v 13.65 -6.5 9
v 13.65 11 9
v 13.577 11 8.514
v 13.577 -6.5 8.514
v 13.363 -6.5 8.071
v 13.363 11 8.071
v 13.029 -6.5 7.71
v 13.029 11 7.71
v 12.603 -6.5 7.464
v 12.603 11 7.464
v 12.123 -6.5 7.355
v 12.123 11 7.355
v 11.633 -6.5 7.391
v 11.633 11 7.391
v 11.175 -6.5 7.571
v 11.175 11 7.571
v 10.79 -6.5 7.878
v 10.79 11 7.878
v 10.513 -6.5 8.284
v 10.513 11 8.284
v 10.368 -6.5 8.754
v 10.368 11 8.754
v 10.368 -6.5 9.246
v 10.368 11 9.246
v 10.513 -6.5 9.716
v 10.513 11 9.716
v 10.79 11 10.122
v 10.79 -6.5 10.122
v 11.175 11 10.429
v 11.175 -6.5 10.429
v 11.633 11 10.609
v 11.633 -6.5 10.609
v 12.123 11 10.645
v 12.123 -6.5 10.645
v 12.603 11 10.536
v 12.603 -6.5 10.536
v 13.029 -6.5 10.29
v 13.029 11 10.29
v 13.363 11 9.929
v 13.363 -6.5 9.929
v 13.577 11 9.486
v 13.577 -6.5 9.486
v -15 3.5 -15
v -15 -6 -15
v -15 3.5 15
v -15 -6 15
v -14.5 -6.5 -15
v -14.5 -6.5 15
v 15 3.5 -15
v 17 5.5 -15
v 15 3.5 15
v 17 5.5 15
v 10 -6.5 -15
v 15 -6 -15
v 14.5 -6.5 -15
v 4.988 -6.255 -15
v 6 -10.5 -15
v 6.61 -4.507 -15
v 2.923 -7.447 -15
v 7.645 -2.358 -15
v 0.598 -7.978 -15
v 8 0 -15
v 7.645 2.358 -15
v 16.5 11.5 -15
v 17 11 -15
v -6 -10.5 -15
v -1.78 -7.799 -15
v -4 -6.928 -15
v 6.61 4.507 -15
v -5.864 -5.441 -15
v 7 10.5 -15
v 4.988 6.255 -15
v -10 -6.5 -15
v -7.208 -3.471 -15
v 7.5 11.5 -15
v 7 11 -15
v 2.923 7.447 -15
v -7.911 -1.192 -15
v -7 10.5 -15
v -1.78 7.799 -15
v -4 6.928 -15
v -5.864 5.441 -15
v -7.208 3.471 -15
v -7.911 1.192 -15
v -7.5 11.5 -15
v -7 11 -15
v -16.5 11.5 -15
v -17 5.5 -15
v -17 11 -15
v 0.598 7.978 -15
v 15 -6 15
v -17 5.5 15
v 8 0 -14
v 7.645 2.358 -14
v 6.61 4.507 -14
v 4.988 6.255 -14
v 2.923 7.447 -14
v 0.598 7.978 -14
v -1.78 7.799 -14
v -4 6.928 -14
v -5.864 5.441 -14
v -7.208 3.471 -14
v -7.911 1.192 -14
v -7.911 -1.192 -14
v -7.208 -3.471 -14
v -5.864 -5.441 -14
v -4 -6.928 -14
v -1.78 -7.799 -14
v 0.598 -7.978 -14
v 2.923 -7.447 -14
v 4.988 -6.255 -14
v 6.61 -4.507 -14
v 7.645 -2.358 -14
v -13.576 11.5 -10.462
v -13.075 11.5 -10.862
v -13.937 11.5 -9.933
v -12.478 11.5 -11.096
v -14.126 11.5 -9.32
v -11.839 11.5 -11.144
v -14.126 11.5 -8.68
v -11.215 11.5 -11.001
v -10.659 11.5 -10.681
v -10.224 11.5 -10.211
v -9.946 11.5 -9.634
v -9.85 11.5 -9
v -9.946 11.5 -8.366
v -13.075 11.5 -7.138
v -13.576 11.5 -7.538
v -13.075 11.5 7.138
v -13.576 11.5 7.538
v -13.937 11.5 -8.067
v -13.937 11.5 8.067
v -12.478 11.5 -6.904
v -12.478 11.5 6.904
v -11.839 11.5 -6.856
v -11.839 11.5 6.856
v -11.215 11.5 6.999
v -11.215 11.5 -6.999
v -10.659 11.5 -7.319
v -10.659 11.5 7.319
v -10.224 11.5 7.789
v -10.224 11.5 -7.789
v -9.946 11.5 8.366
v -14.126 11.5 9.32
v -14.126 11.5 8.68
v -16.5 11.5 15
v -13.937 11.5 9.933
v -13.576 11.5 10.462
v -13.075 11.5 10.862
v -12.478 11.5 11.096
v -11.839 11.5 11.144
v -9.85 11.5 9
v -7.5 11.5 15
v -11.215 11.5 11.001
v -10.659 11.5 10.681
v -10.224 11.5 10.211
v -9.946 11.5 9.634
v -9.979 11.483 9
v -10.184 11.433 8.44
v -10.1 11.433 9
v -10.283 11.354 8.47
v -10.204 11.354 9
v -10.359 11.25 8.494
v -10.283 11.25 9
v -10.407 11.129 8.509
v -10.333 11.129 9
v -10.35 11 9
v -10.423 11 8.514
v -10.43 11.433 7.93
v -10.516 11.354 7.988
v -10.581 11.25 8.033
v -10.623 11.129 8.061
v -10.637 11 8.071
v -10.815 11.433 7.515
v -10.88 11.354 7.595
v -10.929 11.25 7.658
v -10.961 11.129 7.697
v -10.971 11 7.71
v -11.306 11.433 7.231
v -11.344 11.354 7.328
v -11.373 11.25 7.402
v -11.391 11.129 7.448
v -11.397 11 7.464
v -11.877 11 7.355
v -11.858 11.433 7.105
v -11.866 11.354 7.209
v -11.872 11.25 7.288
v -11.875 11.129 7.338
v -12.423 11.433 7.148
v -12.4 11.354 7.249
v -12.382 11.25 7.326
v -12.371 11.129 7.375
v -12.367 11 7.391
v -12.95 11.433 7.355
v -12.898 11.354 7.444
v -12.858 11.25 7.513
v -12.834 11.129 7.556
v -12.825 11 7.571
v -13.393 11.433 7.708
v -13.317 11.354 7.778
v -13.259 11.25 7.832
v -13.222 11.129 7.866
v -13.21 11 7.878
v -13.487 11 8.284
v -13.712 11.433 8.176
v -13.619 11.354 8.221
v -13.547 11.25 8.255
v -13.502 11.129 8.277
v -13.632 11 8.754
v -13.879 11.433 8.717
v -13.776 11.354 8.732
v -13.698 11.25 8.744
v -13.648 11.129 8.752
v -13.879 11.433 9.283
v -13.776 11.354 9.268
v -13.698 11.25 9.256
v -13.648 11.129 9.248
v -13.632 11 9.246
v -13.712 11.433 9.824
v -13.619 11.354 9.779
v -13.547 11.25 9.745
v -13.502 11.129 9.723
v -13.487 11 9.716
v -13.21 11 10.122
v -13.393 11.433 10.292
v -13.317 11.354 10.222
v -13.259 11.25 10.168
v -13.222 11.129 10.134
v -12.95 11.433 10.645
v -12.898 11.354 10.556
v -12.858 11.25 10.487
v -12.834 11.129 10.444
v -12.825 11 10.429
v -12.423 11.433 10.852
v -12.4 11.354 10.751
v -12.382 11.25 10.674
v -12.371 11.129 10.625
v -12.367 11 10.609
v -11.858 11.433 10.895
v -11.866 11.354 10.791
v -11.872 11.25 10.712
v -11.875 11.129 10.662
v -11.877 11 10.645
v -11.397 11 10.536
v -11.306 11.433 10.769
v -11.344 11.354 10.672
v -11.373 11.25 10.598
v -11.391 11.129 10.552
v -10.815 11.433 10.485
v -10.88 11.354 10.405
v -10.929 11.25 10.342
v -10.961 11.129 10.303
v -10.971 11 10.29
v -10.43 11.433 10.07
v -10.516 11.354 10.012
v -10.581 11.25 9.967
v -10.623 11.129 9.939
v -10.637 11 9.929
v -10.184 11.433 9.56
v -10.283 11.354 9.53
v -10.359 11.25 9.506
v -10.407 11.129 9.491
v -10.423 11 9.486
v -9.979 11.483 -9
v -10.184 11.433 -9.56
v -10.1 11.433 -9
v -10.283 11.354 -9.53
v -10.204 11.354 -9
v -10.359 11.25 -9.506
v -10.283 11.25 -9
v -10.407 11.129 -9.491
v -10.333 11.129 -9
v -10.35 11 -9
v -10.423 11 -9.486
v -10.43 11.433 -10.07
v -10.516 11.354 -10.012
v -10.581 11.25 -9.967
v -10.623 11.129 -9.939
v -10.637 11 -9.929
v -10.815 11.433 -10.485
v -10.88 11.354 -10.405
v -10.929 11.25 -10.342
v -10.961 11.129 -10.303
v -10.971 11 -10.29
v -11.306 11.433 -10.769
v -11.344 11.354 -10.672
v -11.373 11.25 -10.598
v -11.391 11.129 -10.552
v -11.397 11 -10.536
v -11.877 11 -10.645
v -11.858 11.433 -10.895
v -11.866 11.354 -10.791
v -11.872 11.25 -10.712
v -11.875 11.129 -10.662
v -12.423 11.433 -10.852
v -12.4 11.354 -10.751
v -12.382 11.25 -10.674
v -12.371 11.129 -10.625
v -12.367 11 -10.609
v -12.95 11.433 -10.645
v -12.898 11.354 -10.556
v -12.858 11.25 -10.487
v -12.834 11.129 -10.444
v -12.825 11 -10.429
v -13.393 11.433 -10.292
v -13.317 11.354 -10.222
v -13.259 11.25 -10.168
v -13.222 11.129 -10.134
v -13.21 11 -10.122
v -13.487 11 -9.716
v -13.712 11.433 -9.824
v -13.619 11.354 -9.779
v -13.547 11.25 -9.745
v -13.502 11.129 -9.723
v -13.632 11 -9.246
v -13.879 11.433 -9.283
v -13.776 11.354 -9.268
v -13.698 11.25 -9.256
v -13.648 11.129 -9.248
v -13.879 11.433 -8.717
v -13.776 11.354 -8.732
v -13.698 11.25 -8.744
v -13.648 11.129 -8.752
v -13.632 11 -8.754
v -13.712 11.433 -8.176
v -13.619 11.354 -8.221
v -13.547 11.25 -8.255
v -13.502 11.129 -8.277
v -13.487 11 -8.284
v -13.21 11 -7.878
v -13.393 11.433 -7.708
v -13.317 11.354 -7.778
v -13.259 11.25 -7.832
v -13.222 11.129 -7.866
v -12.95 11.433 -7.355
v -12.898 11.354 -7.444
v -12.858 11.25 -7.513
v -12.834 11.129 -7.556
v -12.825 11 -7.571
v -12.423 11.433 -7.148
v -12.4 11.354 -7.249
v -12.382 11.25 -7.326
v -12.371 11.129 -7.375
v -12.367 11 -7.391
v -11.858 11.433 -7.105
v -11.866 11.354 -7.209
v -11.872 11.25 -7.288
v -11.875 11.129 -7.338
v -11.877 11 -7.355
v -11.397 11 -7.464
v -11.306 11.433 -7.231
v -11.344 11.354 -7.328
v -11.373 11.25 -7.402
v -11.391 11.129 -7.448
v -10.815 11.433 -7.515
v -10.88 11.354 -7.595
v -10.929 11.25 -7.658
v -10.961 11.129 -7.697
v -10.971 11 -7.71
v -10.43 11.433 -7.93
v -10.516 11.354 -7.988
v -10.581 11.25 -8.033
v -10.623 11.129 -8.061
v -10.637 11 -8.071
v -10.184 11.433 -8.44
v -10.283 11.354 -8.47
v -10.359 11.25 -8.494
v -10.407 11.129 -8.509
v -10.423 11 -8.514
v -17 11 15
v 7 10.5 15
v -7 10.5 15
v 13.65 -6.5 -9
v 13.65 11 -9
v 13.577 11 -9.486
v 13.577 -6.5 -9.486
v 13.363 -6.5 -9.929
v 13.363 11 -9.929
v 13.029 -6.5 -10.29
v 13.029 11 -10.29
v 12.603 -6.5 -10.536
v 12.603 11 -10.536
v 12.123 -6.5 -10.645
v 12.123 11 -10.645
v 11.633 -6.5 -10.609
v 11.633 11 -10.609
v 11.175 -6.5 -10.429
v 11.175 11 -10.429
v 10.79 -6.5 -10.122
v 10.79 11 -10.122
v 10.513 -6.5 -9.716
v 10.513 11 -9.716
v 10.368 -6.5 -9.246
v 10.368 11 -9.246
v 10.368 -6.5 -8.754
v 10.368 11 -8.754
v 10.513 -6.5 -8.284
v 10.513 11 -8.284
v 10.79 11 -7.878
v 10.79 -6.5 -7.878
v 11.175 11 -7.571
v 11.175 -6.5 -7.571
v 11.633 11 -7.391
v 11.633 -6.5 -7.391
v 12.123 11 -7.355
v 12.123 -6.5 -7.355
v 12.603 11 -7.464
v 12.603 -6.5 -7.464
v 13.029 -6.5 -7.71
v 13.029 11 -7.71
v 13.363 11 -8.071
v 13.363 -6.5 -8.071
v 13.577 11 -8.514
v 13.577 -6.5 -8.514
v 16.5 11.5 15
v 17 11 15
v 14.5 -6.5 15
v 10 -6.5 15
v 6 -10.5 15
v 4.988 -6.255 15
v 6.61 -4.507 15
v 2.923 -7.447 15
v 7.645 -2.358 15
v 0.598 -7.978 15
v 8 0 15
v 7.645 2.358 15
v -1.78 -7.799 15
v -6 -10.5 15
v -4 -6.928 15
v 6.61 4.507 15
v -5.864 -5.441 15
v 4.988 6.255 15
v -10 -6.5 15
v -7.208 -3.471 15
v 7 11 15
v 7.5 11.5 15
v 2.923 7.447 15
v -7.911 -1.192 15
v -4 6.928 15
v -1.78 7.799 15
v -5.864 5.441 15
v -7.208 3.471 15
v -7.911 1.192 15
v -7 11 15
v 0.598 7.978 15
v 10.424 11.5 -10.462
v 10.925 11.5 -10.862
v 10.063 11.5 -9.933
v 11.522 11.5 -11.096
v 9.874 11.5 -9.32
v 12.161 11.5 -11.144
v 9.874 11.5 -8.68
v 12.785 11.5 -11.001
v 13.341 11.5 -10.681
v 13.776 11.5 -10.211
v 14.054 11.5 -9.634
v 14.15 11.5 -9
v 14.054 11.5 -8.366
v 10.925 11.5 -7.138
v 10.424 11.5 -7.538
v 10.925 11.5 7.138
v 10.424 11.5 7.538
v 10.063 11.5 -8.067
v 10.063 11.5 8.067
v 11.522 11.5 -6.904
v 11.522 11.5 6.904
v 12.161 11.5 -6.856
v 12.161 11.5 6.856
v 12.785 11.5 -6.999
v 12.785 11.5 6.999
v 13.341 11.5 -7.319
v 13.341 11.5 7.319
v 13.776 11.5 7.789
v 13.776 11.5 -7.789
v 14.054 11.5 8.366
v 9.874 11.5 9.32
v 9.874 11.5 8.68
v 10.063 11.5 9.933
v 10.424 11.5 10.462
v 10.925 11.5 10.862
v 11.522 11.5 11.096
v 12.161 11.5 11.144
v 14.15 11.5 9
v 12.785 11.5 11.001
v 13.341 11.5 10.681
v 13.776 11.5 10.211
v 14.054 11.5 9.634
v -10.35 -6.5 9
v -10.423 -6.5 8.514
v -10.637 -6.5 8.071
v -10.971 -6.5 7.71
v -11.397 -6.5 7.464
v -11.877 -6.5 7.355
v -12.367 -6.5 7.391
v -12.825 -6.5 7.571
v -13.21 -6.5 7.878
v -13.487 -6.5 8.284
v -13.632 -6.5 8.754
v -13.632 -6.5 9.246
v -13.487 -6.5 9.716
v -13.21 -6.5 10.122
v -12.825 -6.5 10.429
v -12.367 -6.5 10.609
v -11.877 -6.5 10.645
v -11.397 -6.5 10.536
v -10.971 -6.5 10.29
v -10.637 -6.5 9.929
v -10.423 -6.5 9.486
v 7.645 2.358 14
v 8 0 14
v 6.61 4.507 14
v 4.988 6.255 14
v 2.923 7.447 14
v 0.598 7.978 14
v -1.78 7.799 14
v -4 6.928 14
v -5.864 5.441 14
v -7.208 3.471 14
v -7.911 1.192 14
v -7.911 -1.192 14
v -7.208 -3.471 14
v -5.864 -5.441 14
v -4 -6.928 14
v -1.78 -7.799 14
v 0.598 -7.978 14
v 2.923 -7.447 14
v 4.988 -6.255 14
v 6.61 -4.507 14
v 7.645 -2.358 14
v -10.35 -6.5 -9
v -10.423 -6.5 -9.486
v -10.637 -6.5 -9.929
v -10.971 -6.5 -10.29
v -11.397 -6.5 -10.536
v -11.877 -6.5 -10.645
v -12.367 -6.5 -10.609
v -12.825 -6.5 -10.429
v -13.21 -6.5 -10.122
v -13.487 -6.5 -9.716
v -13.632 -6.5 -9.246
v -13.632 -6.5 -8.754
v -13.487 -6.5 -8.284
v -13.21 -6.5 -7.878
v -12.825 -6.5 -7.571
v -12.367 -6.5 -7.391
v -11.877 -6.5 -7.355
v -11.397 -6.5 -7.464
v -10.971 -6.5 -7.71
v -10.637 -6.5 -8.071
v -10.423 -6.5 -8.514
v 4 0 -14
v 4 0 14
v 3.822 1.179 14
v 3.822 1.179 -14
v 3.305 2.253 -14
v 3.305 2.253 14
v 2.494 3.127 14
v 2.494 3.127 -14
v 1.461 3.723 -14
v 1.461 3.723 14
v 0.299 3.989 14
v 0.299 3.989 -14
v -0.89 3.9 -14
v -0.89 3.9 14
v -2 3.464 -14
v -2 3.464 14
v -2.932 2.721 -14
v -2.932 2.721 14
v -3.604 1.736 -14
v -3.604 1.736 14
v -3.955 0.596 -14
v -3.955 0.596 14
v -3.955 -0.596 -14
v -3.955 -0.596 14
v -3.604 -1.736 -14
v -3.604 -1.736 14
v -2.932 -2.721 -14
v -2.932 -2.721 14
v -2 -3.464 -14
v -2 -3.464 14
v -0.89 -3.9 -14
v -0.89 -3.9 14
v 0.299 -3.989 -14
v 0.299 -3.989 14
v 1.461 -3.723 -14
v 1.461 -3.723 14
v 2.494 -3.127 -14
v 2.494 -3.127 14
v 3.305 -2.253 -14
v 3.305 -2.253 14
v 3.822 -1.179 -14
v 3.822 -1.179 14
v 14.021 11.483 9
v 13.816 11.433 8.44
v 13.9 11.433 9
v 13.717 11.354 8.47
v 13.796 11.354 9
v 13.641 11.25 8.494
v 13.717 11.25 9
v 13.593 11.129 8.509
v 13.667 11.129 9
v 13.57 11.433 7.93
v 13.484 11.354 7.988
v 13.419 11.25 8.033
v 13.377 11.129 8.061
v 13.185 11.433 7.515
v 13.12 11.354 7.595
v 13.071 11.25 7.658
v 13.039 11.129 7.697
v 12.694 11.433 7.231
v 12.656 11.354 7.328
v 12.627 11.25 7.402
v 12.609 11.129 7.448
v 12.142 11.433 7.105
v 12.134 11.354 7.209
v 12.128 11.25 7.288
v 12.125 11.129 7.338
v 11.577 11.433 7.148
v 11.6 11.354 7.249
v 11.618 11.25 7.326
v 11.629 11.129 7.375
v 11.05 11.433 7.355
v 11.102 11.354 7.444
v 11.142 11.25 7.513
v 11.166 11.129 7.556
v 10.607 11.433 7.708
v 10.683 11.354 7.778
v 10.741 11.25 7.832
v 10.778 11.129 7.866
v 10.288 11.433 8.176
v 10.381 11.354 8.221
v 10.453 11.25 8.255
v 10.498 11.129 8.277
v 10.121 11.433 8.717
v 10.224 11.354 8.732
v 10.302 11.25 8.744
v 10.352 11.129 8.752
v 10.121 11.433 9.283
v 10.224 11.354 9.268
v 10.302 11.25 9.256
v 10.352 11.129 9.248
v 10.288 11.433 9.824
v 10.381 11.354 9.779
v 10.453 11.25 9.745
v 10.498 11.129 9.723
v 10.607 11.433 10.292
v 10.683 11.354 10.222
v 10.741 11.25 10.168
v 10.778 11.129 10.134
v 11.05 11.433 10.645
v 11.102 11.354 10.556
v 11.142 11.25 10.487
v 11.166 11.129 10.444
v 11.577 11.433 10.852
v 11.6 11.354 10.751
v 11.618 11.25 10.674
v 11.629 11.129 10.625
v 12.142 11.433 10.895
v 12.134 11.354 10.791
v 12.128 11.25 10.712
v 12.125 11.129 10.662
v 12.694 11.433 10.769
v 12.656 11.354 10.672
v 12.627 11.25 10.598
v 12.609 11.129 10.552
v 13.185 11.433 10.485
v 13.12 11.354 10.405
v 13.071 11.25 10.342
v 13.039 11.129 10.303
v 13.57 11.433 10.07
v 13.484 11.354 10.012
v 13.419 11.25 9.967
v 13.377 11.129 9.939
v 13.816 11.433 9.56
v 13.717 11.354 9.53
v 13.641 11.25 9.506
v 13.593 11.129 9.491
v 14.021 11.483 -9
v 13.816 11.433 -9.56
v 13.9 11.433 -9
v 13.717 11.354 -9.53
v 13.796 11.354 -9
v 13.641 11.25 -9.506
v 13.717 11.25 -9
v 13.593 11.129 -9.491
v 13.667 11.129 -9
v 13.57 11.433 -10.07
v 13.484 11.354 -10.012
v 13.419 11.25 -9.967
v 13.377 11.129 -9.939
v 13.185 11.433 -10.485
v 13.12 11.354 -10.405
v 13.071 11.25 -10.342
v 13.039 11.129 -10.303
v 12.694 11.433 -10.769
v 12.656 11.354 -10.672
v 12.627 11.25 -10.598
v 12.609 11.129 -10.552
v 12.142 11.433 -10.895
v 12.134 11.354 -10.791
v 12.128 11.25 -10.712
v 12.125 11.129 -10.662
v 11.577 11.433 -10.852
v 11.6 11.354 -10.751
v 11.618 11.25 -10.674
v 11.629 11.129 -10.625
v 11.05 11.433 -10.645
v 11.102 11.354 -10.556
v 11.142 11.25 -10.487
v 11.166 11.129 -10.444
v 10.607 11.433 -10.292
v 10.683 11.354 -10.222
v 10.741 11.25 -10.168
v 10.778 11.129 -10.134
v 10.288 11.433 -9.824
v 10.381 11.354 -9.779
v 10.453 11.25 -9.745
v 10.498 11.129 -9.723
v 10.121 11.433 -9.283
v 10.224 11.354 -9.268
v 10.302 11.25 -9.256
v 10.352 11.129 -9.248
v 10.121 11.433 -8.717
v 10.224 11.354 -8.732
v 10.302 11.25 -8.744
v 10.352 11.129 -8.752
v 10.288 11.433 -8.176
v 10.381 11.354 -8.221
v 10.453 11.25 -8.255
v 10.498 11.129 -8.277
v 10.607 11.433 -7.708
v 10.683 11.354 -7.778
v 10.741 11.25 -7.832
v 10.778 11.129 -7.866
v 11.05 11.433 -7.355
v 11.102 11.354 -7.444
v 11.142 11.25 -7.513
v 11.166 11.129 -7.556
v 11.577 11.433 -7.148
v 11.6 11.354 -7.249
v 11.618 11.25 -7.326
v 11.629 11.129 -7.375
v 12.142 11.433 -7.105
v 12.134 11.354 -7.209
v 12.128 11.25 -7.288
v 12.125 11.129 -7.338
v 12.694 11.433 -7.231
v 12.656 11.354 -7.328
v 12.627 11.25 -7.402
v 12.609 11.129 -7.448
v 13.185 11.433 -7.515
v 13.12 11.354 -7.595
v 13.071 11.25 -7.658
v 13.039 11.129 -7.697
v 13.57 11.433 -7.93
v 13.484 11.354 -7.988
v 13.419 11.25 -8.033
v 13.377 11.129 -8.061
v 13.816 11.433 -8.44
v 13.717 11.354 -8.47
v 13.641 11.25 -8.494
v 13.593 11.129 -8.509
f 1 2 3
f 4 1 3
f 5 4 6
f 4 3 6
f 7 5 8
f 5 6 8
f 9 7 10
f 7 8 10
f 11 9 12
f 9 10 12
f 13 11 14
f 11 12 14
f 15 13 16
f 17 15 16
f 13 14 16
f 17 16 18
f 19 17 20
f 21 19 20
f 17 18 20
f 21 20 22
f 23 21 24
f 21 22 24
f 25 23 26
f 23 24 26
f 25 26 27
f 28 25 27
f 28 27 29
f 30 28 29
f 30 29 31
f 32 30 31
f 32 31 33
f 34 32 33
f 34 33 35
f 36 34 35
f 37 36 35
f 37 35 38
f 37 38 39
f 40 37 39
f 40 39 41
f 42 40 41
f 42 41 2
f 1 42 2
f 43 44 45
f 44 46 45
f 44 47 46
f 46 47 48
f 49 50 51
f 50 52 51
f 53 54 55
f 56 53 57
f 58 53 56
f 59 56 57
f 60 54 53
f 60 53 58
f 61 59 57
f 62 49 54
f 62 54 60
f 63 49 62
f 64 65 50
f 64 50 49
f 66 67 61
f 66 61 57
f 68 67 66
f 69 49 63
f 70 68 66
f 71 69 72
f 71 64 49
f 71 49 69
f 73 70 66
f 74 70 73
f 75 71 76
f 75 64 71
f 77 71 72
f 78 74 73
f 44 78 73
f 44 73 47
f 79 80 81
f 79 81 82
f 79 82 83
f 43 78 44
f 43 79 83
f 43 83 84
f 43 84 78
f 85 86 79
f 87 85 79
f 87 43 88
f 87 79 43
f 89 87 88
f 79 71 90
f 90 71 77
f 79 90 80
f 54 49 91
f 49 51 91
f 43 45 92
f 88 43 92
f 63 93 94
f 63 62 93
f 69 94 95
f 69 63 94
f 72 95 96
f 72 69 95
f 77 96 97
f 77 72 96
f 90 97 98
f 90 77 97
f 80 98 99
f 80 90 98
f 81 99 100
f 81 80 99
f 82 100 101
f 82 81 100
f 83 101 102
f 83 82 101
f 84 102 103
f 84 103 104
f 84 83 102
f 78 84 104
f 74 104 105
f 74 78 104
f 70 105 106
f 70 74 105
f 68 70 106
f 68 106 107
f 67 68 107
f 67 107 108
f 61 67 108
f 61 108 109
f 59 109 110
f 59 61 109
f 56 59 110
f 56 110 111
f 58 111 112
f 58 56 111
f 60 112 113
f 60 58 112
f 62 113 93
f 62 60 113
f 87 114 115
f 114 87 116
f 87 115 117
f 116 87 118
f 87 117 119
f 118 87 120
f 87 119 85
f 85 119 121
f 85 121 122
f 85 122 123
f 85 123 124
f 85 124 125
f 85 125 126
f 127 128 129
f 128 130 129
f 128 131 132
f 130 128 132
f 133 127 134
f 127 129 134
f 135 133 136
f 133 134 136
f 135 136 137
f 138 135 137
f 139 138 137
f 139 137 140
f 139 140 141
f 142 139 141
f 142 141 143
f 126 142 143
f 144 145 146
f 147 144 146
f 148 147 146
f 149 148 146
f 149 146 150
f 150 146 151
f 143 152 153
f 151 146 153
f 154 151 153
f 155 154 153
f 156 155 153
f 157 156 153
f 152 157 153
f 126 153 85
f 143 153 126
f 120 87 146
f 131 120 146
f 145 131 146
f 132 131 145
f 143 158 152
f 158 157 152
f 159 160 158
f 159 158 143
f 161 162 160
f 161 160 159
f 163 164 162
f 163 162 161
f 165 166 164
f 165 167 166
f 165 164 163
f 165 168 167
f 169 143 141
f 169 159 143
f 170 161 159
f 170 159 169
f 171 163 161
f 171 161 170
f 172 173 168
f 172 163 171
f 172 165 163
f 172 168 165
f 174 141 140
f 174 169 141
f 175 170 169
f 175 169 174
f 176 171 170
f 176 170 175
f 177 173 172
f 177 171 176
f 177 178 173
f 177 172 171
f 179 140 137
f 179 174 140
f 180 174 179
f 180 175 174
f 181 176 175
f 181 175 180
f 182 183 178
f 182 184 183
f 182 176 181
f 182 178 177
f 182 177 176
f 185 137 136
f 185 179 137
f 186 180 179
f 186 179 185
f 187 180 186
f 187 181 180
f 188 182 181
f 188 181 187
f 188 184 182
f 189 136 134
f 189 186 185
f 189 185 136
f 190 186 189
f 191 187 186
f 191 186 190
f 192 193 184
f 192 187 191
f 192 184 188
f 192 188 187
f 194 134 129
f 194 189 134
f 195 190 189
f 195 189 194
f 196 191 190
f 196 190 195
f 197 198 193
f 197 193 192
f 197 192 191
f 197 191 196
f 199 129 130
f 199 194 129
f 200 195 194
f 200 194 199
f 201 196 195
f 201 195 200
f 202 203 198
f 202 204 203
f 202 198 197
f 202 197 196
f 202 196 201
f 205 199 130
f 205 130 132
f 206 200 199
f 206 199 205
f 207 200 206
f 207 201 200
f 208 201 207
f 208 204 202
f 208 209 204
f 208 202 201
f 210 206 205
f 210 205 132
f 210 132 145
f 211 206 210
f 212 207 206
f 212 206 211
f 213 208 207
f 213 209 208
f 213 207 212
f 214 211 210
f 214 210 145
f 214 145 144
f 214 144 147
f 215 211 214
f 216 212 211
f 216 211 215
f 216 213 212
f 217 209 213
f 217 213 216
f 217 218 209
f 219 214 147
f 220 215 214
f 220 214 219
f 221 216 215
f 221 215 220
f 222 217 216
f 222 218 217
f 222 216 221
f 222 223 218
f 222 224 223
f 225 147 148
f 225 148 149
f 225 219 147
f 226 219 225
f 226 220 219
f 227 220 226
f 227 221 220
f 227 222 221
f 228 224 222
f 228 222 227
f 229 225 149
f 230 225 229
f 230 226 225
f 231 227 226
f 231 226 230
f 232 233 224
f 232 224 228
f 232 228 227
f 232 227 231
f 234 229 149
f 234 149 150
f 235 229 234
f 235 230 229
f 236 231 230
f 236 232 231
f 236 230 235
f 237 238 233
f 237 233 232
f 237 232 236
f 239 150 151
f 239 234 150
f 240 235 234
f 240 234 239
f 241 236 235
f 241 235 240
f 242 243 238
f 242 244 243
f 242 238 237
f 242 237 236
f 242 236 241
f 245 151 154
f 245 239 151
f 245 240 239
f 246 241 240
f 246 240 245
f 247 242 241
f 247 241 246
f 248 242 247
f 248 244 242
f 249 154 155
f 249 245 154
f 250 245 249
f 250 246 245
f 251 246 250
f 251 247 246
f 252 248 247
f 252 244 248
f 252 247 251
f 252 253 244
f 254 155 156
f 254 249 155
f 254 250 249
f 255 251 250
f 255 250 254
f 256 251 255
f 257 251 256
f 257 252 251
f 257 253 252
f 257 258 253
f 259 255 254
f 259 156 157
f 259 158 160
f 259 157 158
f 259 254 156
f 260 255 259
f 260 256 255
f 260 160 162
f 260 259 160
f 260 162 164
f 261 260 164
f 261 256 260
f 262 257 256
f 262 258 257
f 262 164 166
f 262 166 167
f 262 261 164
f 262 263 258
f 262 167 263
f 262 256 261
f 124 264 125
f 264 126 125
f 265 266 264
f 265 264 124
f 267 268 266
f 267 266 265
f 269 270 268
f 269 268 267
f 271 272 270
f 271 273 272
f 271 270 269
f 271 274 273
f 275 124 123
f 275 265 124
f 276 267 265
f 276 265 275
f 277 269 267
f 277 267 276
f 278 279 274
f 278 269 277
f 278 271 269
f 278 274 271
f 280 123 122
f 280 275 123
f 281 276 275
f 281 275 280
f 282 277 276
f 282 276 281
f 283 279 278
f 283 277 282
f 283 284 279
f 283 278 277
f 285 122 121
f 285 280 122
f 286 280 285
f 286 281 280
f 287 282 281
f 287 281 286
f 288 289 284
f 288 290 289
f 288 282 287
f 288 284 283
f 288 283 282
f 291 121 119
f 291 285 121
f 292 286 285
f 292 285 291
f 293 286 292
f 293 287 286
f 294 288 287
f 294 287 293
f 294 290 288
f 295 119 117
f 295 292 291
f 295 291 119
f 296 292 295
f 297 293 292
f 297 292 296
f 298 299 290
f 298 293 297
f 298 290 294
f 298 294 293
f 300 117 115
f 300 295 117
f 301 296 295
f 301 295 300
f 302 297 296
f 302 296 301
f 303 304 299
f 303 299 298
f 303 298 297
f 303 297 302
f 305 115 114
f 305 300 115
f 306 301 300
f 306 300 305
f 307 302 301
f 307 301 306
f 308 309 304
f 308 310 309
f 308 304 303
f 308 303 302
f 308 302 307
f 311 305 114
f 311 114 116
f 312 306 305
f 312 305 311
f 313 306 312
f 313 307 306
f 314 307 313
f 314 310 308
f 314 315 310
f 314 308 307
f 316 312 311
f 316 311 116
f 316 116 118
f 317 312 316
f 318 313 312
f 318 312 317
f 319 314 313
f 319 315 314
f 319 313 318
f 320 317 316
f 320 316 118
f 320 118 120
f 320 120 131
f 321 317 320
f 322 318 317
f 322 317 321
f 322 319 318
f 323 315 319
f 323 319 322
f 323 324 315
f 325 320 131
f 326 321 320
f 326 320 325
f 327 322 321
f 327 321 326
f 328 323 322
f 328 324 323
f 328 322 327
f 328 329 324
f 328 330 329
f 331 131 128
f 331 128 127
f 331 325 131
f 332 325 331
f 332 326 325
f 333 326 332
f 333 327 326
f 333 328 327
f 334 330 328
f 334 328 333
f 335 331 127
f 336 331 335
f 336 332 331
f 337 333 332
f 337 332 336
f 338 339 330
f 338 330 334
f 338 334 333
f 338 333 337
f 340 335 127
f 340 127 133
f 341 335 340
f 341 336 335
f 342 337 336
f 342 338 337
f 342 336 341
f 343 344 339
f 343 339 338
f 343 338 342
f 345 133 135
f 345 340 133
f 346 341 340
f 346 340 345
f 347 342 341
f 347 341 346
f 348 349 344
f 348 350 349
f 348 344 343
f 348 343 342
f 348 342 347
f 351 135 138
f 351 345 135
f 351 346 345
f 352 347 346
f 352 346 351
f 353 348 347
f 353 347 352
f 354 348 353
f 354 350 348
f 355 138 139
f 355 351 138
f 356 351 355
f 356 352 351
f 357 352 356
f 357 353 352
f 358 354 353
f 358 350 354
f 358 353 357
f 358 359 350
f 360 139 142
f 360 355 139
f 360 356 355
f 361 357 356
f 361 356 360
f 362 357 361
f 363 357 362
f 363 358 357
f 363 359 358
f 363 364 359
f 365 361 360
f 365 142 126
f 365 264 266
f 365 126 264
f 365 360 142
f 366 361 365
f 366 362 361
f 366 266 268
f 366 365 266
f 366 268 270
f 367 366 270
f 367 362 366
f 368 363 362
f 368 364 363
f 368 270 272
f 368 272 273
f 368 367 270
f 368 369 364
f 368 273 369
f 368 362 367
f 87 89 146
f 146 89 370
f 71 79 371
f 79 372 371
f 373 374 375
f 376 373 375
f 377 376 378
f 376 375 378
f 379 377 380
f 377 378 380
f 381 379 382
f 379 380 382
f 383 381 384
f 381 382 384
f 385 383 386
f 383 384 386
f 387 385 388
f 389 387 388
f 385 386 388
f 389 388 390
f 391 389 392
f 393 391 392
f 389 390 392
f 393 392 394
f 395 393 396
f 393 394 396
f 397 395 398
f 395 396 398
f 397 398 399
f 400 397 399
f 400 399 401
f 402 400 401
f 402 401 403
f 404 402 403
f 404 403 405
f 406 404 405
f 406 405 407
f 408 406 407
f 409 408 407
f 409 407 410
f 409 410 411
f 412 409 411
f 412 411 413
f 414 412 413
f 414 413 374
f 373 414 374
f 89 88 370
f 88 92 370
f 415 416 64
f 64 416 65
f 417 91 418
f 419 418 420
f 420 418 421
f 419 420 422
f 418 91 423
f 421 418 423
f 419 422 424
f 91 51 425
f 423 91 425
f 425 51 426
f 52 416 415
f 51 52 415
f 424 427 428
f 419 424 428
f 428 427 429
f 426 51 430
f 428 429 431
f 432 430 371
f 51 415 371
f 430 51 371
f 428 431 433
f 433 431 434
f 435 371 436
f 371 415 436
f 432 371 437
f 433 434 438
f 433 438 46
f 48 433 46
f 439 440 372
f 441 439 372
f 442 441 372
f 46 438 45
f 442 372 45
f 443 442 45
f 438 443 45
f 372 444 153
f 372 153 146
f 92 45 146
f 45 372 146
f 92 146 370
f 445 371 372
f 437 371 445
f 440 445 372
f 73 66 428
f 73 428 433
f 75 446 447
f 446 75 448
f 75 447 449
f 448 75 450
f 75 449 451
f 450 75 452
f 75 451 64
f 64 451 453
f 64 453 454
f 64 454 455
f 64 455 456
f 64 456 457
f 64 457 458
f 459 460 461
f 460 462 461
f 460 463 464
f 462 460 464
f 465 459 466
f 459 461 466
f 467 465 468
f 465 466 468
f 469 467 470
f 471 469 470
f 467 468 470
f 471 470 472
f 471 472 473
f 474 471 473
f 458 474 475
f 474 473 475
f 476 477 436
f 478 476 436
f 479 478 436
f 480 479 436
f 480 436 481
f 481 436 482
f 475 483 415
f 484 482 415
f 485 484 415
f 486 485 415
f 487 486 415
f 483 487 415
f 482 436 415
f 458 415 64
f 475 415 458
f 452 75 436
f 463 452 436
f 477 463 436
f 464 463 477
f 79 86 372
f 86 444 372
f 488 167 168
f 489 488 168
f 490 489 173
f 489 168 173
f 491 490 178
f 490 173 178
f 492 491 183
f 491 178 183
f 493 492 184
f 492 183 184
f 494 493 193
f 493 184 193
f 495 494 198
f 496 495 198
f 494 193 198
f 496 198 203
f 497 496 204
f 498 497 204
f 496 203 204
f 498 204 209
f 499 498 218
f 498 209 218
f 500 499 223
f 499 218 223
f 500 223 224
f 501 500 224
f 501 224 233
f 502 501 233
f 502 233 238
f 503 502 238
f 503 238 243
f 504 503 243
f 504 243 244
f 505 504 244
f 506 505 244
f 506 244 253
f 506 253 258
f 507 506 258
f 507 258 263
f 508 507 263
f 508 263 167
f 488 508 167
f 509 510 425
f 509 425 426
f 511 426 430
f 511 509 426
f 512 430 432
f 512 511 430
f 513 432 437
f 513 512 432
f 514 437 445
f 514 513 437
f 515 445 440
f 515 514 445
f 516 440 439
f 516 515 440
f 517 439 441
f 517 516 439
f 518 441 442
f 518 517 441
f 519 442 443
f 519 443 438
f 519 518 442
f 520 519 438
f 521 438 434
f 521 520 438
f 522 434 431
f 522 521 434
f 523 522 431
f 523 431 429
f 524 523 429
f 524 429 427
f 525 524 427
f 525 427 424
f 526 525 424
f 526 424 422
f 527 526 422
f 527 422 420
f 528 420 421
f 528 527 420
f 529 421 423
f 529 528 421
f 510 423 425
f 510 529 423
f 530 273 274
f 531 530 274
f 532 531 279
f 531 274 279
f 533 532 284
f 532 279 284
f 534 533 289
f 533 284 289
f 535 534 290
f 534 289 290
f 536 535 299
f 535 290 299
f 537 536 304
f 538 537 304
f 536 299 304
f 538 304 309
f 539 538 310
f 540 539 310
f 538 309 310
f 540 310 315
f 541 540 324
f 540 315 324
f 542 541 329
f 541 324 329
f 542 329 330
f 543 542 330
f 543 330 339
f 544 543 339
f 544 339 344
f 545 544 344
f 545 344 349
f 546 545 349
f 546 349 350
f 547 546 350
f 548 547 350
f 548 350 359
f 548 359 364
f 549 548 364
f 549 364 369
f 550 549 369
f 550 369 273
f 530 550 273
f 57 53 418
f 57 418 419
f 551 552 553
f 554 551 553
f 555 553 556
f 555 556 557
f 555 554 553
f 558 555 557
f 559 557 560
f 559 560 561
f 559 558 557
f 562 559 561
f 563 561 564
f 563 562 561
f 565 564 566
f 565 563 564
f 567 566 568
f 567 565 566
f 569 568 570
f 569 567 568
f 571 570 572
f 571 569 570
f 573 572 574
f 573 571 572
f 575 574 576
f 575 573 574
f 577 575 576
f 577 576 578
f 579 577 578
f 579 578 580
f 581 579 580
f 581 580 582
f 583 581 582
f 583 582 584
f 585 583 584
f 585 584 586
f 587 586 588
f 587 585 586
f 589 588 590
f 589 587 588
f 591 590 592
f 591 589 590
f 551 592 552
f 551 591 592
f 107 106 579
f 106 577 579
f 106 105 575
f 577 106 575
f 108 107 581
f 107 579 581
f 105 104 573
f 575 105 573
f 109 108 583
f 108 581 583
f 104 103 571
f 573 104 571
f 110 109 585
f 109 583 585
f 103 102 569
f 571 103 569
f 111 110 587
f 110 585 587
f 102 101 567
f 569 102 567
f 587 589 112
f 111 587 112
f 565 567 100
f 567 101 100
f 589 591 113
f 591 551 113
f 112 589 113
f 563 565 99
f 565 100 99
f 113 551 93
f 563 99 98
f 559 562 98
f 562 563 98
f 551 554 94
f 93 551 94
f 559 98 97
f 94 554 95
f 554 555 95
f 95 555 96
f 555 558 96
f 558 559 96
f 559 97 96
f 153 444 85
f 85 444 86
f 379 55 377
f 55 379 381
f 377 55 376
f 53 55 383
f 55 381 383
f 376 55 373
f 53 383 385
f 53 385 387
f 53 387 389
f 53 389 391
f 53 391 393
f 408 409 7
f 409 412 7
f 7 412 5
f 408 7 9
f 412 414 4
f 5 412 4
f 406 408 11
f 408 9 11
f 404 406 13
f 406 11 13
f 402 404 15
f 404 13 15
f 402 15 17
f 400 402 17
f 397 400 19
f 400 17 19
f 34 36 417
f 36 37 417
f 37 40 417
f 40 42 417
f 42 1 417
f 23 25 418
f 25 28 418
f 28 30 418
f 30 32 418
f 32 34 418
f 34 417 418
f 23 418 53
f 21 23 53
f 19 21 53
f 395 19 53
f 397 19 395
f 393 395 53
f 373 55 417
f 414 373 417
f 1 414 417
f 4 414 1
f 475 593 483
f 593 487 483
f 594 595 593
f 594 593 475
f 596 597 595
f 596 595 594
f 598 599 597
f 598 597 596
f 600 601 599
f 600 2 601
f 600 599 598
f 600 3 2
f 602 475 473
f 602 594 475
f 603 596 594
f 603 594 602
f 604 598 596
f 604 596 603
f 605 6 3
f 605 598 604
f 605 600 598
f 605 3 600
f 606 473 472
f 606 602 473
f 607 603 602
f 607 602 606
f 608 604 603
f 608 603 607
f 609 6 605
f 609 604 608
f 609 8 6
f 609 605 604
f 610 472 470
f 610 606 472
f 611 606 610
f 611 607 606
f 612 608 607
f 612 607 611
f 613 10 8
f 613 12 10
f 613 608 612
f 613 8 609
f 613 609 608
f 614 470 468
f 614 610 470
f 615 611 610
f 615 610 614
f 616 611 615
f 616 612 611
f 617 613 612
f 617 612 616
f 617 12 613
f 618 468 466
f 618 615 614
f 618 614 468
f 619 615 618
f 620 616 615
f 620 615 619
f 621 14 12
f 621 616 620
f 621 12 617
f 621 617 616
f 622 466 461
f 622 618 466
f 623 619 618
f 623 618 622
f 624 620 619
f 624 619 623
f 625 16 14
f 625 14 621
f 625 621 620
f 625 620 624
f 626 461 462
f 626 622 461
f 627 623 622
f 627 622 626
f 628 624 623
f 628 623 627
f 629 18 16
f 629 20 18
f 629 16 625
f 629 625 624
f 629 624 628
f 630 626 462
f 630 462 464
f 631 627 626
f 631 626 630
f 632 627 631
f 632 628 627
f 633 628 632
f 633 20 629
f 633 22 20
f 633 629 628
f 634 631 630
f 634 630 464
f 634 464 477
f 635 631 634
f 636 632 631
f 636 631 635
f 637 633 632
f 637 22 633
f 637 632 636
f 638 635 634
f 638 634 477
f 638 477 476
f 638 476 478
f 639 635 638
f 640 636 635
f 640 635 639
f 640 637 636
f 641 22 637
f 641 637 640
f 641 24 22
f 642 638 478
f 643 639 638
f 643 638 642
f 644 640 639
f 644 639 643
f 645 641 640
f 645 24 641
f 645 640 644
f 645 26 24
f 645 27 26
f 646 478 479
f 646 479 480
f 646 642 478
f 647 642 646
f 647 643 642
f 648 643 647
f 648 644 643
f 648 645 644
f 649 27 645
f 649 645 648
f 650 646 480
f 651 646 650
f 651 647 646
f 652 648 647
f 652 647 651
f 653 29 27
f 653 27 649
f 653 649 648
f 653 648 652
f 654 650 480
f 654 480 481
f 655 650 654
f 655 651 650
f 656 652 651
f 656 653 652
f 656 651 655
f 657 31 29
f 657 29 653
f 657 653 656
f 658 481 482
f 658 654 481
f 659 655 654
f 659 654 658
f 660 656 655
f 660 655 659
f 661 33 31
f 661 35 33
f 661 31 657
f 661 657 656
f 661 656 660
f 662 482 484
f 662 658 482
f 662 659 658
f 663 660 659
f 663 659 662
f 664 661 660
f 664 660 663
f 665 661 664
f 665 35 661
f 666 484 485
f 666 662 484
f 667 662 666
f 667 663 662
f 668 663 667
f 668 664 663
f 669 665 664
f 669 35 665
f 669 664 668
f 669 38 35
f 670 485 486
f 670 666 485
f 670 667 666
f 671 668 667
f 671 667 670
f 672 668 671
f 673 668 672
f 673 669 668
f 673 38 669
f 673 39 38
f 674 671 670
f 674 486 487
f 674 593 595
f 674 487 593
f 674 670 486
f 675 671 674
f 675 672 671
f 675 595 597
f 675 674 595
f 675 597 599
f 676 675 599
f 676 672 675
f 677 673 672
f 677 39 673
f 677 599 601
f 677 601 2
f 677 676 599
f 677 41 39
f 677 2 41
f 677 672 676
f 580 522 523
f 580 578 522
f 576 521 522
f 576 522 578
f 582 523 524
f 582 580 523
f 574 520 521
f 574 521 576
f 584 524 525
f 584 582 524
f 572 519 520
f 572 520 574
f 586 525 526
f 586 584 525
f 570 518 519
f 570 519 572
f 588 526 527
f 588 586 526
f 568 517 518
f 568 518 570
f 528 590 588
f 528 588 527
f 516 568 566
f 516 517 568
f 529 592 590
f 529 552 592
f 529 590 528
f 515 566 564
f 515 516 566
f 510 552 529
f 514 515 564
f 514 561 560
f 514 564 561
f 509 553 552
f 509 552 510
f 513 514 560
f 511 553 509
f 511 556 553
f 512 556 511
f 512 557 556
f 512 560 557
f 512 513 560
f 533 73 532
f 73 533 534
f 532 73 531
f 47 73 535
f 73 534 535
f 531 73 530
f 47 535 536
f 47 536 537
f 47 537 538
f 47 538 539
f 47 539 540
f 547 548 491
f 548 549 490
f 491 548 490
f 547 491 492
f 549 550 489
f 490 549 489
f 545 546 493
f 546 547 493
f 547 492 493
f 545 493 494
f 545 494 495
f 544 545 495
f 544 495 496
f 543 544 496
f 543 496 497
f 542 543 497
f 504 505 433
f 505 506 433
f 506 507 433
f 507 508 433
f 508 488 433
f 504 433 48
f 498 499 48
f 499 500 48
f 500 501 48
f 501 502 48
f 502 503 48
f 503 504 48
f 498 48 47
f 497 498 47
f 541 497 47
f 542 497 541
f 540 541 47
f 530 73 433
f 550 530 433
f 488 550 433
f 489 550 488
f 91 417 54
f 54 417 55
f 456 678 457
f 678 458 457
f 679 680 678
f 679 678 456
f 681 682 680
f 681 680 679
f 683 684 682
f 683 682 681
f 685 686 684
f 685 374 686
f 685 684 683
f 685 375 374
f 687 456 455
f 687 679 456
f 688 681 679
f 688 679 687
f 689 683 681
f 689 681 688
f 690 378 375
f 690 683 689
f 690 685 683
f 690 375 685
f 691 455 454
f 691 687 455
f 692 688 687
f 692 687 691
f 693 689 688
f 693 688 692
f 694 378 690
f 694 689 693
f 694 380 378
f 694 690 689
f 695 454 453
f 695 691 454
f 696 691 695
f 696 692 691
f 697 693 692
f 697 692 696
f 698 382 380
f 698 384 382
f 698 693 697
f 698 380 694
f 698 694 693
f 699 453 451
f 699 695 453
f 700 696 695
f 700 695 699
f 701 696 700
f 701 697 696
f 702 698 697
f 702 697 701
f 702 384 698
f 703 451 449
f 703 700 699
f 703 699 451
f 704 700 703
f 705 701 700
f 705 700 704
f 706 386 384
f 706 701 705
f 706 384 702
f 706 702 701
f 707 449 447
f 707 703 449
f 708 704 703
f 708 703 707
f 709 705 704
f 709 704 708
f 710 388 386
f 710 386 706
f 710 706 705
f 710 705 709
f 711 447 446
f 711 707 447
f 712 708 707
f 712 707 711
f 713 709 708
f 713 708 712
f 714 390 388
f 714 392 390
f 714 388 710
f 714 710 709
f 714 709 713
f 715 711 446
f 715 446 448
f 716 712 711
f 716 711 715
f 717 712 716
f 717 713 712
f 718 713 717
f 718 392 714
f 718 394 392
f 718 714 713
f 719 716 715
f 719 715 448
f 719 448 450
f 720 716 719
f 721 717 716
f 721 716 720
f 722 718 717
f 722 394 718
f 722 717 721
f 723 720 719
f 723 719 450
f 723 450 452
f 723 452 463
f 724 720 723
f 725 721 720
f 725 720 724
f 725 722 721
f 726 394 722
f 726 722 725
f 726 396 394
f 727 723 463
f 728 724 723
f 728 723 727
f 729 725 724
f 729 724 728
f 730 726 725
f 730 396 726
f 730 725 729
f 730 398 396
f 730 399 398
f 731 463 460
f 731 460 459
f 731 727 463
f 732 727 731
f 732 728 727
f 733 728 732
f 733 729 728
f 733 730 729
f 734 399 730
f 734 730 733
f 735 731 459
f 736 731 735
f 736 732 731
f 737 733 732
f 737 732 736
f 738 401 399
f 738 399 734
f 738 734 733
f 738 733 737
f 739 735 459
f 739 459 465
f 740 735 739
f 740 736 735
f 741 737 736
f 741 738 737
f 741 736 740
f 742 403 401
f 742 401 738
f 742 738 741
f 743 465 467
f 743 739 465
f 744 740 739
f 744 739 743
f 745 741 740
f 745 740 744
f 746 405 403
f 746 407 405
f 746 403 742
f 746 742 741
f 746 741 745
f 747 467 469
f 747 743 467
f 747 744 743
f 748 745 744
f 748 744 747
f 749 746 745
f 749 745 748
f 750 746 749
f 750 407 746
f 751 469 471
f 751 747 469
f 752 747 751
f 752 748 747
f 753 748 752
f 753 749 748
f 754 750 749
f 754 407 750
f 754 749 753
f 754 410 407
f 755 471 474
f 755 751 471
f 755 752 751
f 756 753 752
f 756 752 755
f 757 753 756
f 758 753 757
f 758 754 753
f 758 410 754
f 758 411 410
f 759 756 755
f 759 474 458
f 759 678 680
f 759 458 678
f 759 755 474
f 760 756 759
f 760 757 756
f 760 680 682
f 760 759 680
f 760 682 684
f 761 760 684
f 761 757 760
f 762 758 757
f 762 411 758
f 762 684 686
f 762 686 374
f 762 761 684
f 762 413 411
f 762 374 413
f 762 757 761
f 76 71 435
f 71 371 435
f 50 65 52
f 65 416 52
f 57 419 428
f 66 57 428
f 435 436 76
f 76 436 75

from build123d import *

# Parameters (mm, degrees)
SKETCH1_R           = 8
BOSS_EXTRUDE1_DEPTH = 15
SKETCH2_R           = 1.65
CUT_EXTRUDE1_DEPTH  = 23
SKETCH3_R           = 8
SKETCH3_R_2         = 4
BOSS_EXTRUDE2_DEPTH = 14
FILLET1_R           = 0.5
CHAMFER1_SIZE       = 0.5


with BuildPart() as part:
    # Sketch1 → Boss-Extrude1 (new body, symmetric)
    with BuildSketch(Plane.XY):
        Polygon((-17, 11.5), (-7, 11.5), (-7, 10.5), (7, 10.5), (7, 11.5), (17, 11.5), (17, 5.5), (15, 3.5), (15, -6.5), (10, -6.5), (6, -10.5), (-6, -10.5), (-10, -6.5), (-15, -6.5), (-15, 3.5), (-17, 5.5), align=None)
        Circle(SKETCH1_R, mode=Mode.SUBTRACT)
    extrude(amount=BOSS_EXTRUDE1_DEPTH, both=True)

    # Sketch2 → Cut-Extrude1 (cut, through all)
    with BuildSketch(Plane(origin=(0, 11.5, 0), x_dir=(1, 0, 0), z_dir=(0, 1, 0))):
        with Locations((-12, 9)):
            Circle(SKETCH2_R)
        with Locations((-12, -9)):
            Circle(SKETCH2_R)
        with Locations((12, -9)):
            Circle(SKETCH2_R)
        with Locations((12, 9)):
            Circle(SKETCH2_R)
    extrude(amount=-CUT_EXTRUDE1_DEPTH, mode=Mode.SUBTRACT)

    # Sketch3 → Boss-Extrude2 (add, symmetric)
    with BuildSketch(Plane.XY):
        Circle(SKETCH3_R)
        Circle(SKETCH3_R_2, mode=Mode.SUBTRACT)
    extrude(amount=BOSS_EXTRUDE2_DEPTH, both=True)

    # Fillet1
    fillet1_edges = [part.edges().sort_by_distance(p)[0] for p in [
        (-13.65, 11.5, -9),
        (-13.65, 11.5, 9),
        (10.35, 11.5, 9),
        (10.35, 11.5, -9),
    ]]
    fillet(fillet1_edges, radius=FILLET1_R)

    # Chamfer1
    chamfer1_edges = [part.edges().sort_by_distance(p)[0] for p in [
        (-17, 11.5, 0),
        (-7, 11.5, 0),
        (7, 11.5, 0),
        (17, 11.5, 0),
        (15, -6.5, 0),
        (-15, -6.5, 0),
    ]]
    chamfer(chamfer1_edges, length=CHAMFER1_SIZE)


solid = part.part
